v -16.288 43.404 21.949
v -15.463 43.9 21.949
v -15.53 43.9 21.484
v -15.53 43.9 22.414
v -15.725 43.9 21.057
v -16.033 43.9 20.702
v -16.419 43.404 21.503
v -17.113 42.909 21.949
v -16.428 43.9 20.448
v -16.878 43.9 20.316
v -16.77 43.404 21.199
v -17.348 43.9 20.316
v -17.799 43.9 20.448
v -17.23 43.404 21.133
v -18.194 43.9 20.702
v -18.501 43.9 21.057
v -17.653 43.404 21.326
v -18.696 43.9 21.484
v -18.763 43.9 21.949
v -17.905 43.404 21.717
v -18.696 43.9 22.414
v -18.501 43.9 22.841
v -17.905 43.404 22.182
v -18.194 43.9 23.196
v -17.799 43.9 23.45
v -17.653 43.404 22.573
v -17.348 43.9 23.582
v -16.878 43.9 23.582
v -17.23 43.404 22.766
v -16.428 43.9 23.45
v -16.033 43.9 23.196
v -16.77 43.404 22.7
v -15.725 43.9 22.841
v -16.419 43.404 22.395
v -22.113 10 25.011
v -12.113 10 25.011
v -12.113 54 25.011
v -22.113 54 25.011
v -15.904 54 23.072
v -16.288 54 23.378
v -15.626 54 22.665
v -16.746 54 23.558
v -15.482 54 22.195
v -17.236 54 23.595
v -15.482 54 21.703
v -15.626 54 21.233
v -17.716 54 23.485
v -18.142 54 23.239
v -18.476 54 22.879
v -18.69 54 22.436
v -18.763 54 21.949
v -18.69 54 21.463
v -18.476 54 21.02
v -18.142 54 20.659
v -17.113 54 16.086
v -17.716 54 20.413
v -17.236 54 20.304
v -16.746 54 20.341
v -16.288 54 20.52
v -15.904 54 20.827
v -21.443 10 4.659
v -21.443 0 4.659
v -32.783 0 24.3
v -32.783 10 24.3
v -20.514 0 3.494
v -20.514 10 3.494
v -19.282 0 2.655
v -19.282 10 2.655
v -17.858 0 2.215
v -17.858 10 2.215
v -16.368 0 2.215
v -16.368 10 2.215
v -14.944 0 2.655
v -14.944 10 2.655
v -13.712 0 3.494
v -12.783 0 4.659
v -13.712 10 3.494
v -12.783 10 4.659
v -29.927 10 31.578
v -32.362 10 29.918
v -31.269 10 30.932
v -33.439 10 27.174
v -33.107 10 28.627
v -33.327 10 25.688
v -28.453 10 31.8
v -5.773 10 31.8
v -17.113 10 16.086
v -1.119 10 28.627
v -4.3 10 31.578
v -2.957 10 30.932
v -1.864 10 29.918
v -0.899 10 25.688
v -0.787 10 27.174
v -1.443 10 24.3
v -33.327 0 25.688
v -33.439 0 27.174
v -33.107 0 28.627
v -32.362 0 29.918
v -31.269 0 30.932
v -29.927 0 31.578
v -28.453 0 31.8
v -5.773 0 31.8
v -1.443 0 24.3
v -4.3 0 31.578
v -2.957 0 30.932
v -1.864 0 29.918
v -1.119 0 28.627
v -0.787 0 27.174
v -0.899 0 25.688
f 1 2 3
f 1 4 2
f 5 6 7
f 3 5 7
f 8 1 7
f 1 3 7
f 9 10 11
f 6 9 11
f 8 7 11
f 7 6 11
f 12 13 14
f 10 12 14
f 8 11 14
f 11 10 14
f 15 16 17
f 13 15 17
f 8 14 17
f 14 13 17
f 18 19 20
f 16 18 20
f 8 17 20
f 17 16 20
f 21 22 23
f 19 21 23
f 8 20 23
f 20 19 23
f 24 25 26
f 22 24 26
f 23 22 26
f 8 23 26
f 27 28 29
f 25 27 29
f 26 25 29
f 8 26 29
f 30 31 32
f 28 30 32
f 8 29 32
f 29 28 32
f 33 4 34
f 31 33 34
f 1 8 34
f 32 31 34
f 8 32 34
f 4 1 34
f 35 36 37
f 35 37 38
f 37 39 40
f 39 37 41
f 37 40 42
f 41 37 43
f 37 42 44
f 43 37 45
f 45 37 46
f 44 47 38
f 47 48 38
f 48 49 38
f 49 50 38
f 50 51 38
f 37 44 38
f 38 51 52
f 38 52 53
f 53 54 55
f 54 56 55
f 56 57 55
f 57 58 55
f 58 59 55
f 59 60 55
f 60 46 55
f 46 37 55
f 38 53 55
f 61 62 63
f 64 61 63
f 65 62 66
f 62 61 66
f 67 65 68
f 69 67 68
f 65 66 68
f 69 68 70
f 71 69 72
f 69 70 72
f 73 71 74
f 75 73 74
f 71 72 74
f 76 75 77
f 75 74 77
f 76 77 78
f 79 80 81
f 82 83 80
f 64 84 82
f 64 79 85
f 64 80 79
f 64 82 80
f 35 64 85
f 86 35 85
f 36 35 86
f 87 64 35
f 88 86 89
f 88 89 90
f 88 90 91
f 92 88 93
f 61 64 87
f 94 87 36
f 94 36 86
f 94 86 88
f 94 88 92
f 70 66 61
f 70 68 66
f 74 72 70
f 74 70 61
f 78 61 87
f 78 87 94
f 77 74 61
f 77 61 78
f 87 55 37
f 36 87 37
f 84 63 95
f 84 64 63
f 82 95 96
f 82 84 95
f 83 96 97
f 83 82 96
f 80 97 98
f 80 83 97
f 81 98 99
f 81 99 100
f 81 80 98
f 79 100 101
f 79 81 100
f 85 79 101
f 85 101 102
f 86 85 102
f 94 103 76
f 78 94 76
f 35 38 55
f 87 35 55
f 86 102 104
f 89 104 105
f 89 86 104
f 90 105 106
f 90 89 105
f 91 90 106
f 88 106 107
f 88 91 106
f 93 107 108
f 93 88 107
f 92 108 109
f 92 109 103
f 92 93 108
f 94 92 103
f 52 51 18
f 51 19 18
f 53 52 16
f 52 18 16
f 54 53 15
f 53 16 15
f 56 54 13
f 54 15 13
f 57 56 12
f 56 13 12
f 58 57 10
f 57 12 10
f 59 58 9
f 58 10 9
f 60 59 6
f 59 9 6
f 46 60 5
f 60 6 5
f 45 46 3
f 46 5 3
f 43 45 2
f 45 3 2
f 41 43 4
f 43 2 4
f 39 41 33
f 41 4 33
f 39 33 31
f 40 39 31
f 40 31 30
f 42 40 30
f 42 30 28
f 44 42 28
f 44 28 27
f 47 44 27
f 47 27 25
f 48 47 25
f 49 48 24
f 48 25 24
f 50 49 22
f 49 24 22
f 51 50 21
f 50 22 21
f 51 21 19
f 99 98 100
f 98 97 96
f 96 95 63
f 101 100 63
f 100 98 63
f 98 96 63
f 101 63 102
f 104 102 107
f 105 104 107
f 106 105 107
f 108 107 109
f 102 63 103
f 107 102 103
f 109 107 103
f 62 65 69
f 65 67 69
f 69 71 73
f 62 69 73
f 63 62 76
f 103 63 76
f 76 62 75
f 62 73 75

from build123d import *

# Parameters (mm, degrees)
EXTRUDE_1_DEPTH        = 10
FILLET_1_R             = 5
EXTRUDE_2_DEPTH        = 44
HOLE_WIZARD_M4_1_D     = 3.3
HOLE_WIZARD_M4_1_DEPTH = 10.1
HOLE_WIZARD_M4_1_TIP   = 0.991420021


with BuildPart() as part:
    # 草图1 → 凸台-拉伸1 (new body)
    with BuildSketch(Plane(origin=(0, 0, 0), x_dir=(1, 0, 0), z_dir=(0, 1, 0))):
        Polygon((-17.113074928, 2.840600346), (-37.113074928, -31.800415806), (2.886925072, -31.800415806), align=None)
    extrude(amount=EXTRUDE_1_DEPTH)

    # 圆角1
    fillet_1_edges = [part.edges().sort_by_distance(p)[0] for p in [
        (2.886925072, 5, 31.800415806),
        (-37.113074928, 5, 31.800415806),
        (-17.113074928, 5, -2.840600346),
    ]]
    fillet(fillet_1_edges, radius=FILLET_1_R)

    # 草图2 → 凸台-拉伸2 (add)
    with BuildSketch(Plane(origin=(0, 10, 0), x_dir=(1, 0, 0), z_dir=(0, 1, 0))):
        Polygon((-17.113074928, -16.086161566), (-12.113074928, -25.011274713), (-22.113074928, -25.011274713), align=None)
    extrude(amount=EXTRUDE_2_DEPTH)

    # M4 螺纹孔1
    with Locations(Plane(origin=(0, 54, 0), x_dir=(1, 0, 0), z_dir=(0, 1, 0))):
        with Locations((-17.113074928, -21.949260608)):
            Hole(HOLE_WIZARD_M4_1_D / 2, depth=HOLE_WIZARD_M4_1_DEPTH)
            with Locations((0, 0, -(HOLE_WIZARD_M4_1_DEPTH + HOLE_WIZARD_M4_1_TIP / 2))):  # 118° drill point
                Cone(0, HOLE_WIZARD_M4_1_D / 2, HOLE_WIZARD_M4_1_TIP, mode=Mode.SUBTRACT)


solid = part.part
